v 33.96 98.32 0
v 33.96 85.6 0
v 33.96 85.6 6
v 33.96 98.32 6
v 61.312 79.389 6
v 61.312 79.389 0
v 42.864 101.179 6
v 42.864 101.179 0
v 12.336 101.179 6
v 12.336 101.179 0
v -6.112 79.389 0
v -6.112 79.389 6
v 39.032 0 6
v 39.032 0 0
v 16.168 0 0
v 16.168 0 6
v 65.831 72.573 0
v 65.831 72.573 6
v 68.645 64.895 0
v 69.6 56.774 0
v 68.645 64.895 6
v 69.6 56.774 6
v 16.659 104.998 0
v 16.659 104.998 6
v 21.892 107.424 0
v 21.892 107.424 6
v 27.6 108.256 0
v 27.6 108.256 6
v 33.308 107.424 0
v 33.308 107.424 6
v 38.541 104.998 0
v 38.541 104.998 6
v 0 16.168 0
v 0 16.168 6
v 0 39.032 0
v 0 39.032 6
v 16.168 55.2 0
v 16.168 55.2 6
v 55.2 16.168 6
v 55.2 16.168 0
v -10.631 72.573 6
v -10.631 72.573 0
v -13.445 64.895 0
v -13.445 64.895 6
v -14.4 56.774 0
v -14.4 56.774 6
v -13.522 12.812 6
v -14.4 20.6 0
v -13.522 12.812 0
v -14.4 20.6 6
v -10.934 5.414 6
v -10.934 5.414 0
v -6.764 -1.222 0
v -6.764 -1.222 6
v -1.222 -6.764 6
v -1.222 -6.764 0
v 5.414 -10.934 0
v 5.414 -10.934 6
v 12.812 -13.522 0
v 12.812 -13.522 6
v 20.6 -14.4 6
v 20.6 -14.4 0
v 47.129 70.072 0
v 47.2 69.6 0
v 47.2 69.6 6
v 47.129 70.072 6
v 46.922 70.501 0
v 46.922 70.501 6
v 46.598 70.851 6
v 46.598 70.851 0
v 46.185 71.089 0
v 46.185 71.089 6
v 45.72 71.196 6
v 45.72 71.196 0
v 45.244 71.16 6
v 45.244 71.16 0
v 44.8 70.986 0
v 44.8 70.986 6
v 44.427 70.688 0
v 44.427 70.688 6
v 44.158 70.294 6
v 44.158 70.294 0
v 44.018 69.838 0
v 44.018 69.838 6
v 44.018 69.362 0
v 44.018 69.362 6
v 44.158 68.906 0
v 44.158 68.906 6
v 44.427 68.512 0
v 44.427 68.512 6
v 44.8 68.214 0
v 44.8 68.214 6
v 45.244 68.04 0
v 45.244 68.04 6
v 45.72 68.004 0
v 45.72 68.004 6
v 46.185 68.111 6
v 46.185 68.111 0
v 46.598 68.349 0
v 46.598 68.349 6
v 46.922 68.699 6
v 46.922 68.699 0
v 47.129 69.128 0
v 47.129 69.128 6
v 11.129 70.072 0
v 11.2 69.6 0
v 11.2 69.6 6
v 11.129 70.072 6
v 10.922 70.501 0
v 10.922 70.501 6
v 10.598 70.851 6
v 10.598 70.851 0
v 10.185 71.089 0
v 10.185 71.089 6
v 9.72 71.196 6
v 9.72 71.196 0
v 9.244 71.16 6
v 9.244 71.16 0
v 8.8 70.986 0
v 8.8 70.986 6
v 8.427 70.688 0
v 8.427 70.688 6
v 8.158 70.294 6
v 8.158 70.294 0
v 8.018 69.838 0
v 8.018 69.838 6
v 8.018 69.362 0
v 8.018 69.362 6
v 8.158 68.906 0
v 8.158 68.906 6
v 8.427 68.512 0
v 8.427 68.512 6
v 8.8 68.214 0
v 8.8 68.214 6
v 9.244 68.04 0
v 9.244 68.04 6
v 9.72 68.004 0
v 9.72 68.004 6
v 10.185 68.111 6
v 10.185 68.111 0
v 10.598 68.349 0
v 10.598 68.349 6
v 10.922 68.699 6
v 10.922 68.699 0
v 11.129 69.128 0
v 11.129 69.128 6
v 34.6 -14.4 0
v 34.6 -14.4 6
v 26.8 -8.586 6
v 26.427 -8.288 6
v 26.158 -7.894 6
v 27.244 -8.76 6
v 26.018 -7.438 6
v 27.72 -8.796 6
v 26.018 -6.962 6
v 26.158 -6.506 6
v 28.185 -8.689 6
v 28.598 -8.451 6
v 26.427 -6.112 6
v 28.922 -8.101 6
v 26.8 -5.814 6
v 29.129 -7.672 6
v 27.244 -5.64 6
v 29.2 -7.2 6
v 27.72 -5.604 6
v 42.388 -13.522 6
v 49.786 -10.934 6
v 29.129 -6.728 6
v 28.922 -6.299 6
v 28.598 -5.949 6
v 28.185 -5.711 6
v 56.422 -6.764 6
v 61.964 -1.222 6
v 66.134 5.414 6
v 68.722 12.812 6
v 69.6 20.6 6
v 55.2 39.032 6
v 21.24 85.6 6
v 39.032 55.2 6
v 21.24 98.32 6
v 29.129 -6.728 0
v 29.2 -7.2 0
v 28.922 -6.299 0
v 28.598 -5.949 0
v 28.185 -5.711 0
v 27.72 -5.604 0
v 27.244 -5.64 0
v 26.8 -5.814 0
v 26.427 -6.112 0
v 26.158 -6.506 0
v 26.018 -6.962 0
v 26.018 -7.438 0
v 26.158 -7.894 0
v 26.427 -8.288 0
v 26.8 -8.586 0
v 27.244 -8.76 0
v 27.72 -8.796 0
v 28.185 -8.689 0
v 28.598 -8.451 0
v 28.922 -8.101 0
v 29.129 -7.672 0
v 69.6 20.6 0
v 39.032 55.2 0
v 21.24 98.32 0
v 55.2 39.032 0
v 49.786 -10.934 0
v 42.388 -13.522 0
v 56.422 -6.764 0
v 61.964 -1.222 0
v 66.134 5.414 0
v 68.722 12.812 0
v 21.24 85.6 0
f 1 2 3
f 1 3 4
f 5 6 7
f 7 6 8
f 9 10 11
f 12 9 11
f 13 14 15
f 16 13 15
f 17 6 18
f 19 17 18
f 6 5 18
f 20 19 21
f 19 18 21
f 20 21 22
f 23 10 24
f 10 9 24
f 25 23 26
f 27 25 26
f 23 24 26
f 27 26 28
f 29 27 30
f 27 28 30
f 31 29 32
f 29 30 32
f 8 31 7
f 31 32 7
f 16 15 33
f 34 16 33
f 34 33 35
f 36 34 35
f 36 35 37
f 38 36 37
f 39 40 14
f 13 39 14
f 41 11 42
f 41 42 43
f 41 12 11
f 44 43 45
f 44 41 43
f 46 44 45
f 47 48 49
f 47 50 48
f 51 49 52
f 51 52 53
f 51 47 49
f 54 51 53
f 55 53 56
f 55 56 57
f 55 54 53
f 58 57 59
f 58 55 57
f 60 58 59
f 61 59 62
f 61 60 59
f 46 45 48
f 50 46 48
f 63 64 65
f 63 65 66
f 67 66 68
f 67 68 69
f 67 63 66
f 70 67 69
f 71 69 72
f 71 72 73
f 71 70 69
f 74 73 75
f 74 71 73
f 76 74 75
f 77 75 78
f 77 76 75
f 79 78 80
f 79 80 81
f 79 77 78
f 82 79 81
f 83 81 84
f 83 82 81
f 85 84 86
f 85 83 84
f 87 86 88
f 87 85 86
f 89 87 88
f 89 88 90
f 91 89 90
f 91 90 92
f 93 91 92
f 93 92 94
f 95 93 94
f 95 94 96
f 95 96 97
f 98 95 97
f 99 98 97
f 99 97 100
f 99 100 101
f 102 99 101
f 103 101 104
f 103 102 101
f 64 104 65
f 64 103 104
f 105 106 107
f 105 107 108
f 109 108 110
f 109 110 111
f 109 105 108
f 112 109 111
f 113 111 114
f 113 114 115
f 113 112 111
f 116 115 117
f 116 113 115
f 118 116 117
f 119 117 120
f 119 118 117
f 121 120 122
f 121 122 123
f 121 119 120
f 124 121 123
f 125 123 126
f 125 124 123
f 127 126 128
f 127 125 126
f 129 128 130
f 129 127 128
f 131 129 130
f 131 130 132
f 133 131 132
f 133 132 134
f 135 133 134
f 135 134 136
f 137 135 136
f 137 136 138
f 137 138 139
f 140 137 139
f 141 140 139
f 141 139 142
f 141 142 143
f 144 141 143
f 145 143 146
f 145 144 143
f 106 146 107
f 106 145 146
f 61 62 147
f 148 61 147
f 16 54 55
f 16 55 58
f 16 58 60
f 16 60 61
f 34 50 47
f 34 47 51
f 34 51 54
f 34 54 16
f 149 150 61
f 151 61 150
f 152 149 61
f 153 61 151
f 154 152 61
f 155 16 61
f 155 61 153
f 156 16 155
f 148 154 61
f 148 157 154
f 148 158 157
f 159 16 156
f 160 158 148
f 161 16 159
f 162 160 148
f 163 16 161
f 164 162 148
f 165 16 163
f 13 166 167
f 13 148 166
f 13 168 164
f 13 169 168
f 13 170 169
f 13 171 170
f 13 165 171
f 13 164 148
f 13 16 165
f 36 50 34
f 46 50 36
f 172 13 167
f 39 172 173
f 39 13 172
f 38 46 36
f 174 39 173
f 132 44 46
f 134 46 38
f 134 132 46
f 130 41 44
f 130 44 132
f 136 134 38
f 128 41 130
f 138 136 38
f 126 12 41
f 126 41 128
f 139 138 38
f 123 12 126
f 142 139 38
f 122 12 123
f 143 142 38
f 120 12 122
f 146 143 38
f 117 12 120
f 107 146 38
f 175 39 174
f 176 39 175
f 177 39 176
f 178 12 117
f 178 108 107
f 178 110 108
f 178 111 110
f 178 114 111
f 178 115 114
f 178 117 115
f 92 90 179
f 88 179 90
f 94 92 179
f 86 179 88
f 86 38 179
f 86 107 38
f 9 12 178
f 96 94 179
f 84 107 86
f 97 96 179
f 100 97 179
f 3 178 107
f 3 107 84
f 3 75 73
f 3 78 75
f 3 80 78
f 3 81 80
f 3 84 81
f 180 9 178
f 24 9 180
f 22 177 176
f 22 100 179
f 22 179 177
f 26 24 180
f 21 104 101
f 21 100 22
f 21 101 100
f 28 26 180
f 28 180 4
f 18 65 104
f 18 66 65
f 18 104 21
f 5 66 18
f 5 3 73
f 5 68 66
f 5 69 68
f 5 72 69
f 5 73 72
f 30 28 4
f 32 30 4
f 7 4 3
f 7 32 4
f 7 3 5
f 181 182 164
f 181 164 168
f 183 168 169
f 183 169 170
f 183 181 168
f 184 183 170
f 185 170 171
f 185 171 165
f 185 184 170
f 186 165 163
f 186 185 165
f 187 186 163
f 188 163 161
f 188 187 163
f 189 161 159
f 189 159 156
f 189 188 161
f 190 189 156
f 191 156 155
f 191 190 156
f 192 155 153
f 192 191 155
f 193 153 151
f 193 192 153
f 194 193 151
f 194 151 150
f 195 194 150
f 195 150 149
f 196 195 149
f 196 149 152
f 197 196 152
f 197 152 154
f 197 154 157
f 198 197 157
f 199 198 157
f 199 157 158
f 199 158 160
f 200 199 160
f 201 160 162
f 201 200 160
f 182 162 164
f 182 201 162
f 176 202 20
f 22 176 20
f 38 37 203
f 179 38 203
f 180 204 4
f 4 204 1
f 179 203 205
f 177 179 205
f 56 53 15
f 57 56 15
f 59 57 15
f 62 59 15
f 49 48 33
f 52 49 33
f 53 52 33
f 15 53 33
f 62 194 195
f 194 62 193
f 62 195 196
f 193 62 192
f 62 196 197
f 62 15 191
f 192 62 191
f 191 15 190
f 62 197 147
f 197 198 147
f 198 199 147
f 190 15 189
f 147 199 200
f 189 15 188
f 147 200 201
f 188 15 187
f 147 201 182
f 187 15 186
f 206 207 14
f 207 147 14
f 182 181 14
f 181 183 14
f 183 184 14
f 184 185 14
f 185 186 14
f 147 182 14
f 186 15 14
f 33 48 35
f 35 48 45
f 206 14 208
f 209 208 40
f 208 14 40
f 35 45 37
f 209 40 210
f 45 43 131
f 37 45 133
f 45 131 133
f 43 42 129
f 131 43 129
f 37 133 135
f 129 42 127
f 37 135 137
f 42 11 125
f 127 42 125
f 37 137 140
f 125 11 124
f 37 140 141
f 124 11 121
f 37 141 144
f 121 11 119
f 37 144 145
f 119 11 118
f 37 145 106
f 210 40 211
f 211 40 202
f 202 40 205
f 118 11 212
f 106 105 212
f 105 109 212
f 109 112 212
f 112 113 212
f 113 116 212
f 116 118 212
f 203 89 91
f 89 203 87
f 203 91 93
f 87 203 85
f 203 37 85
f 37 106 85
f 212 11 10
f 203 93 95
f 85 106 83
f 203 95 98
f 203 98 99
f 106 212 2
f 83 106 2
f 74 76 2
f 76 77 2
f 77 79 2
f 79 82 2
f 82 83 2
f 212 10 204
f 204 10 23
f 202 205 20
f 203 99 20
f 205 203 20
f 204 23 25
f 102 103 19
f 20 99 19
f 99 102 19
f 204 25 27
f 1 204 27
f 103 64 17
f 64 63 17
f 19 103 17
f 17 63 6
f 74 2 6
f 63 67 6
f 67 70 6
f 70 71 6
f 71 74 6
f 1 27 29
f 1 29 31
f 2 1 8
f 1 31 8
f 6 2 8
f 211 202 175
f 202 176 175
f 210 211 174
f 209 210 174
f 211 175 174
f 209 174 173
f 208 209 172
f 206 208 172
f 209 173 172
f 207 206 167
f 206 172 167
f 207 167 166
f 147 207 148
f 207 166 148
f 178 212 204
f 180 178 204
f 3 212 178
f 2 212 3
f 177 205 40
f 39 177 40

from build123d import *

# Parameters (mm, degrees)
F0_R     = 1.6
F0_W     = 12.72
F0_H     = 12.72
F1_DEPTH = 6
F2_R     = 35
F3_R     = 20


with BuildPart() as f1:
    # F0 (on Top) → F1 (new body)
    with BuildSketch(Plane.XY):
        Polygon((27.6, 119.208467), (-14.4, 69.6), (-14.4, -14.4), (69.6, -14.4), (69.6, 69.6), align=None)
        with Locations((27.6, -7.2)):
            Circle(F0_R, mode=Mode.SUBTRACT)
        Polygon((27.6, 0), (16.167706, 0), (8.083853, 8.083853), (0, 16.167706), (0, 27.6), (0, 39.032294), (8.083853, 47.116147), (16.167706, 55.2), (27.6, 55.2), (39.032294, 55.2), (47.116147, 47.116147), (55.2, 39.032294), (55.2, 27.6), (55.2, 16.167706), (47.116147, 8.083853), (39.032294, 0), align=None, mode=Mode.SUBTRACT)
        with Locations((9.6, 69.6)):
            Circle(F0_R, mode=Mode.SUBTRACT)
        with Locations((45.6, 69.6)):
            Circle(F0_R, mode=Mode.SUBTRACT)
        with Locations((27.6, 91.96)):
            Rectangle(F0_W, F0_H, mode=Mode.SUBTRACT)
    extrude(amount=F1_DEPTH)

    # F2
    f2_edges = [f1.edges().sort_by_distance(p)[0] for p in [
        (69.6, -14.4, 3),
        (-14.4, -14.4, 3),
        (-14.4, 69.6, 3),
        (69.6, 69.6, 3),
    ]]
    fillet(f2_edges, radius=F2_R)

    # F3
    f3_edges = [f1.edges().sort_by_distance(p)[0] for p in [
        (27.6, 119.208467, 3),
    ]]
    fillet(f3_edges, radius=F3_R)


solid = f1.part
